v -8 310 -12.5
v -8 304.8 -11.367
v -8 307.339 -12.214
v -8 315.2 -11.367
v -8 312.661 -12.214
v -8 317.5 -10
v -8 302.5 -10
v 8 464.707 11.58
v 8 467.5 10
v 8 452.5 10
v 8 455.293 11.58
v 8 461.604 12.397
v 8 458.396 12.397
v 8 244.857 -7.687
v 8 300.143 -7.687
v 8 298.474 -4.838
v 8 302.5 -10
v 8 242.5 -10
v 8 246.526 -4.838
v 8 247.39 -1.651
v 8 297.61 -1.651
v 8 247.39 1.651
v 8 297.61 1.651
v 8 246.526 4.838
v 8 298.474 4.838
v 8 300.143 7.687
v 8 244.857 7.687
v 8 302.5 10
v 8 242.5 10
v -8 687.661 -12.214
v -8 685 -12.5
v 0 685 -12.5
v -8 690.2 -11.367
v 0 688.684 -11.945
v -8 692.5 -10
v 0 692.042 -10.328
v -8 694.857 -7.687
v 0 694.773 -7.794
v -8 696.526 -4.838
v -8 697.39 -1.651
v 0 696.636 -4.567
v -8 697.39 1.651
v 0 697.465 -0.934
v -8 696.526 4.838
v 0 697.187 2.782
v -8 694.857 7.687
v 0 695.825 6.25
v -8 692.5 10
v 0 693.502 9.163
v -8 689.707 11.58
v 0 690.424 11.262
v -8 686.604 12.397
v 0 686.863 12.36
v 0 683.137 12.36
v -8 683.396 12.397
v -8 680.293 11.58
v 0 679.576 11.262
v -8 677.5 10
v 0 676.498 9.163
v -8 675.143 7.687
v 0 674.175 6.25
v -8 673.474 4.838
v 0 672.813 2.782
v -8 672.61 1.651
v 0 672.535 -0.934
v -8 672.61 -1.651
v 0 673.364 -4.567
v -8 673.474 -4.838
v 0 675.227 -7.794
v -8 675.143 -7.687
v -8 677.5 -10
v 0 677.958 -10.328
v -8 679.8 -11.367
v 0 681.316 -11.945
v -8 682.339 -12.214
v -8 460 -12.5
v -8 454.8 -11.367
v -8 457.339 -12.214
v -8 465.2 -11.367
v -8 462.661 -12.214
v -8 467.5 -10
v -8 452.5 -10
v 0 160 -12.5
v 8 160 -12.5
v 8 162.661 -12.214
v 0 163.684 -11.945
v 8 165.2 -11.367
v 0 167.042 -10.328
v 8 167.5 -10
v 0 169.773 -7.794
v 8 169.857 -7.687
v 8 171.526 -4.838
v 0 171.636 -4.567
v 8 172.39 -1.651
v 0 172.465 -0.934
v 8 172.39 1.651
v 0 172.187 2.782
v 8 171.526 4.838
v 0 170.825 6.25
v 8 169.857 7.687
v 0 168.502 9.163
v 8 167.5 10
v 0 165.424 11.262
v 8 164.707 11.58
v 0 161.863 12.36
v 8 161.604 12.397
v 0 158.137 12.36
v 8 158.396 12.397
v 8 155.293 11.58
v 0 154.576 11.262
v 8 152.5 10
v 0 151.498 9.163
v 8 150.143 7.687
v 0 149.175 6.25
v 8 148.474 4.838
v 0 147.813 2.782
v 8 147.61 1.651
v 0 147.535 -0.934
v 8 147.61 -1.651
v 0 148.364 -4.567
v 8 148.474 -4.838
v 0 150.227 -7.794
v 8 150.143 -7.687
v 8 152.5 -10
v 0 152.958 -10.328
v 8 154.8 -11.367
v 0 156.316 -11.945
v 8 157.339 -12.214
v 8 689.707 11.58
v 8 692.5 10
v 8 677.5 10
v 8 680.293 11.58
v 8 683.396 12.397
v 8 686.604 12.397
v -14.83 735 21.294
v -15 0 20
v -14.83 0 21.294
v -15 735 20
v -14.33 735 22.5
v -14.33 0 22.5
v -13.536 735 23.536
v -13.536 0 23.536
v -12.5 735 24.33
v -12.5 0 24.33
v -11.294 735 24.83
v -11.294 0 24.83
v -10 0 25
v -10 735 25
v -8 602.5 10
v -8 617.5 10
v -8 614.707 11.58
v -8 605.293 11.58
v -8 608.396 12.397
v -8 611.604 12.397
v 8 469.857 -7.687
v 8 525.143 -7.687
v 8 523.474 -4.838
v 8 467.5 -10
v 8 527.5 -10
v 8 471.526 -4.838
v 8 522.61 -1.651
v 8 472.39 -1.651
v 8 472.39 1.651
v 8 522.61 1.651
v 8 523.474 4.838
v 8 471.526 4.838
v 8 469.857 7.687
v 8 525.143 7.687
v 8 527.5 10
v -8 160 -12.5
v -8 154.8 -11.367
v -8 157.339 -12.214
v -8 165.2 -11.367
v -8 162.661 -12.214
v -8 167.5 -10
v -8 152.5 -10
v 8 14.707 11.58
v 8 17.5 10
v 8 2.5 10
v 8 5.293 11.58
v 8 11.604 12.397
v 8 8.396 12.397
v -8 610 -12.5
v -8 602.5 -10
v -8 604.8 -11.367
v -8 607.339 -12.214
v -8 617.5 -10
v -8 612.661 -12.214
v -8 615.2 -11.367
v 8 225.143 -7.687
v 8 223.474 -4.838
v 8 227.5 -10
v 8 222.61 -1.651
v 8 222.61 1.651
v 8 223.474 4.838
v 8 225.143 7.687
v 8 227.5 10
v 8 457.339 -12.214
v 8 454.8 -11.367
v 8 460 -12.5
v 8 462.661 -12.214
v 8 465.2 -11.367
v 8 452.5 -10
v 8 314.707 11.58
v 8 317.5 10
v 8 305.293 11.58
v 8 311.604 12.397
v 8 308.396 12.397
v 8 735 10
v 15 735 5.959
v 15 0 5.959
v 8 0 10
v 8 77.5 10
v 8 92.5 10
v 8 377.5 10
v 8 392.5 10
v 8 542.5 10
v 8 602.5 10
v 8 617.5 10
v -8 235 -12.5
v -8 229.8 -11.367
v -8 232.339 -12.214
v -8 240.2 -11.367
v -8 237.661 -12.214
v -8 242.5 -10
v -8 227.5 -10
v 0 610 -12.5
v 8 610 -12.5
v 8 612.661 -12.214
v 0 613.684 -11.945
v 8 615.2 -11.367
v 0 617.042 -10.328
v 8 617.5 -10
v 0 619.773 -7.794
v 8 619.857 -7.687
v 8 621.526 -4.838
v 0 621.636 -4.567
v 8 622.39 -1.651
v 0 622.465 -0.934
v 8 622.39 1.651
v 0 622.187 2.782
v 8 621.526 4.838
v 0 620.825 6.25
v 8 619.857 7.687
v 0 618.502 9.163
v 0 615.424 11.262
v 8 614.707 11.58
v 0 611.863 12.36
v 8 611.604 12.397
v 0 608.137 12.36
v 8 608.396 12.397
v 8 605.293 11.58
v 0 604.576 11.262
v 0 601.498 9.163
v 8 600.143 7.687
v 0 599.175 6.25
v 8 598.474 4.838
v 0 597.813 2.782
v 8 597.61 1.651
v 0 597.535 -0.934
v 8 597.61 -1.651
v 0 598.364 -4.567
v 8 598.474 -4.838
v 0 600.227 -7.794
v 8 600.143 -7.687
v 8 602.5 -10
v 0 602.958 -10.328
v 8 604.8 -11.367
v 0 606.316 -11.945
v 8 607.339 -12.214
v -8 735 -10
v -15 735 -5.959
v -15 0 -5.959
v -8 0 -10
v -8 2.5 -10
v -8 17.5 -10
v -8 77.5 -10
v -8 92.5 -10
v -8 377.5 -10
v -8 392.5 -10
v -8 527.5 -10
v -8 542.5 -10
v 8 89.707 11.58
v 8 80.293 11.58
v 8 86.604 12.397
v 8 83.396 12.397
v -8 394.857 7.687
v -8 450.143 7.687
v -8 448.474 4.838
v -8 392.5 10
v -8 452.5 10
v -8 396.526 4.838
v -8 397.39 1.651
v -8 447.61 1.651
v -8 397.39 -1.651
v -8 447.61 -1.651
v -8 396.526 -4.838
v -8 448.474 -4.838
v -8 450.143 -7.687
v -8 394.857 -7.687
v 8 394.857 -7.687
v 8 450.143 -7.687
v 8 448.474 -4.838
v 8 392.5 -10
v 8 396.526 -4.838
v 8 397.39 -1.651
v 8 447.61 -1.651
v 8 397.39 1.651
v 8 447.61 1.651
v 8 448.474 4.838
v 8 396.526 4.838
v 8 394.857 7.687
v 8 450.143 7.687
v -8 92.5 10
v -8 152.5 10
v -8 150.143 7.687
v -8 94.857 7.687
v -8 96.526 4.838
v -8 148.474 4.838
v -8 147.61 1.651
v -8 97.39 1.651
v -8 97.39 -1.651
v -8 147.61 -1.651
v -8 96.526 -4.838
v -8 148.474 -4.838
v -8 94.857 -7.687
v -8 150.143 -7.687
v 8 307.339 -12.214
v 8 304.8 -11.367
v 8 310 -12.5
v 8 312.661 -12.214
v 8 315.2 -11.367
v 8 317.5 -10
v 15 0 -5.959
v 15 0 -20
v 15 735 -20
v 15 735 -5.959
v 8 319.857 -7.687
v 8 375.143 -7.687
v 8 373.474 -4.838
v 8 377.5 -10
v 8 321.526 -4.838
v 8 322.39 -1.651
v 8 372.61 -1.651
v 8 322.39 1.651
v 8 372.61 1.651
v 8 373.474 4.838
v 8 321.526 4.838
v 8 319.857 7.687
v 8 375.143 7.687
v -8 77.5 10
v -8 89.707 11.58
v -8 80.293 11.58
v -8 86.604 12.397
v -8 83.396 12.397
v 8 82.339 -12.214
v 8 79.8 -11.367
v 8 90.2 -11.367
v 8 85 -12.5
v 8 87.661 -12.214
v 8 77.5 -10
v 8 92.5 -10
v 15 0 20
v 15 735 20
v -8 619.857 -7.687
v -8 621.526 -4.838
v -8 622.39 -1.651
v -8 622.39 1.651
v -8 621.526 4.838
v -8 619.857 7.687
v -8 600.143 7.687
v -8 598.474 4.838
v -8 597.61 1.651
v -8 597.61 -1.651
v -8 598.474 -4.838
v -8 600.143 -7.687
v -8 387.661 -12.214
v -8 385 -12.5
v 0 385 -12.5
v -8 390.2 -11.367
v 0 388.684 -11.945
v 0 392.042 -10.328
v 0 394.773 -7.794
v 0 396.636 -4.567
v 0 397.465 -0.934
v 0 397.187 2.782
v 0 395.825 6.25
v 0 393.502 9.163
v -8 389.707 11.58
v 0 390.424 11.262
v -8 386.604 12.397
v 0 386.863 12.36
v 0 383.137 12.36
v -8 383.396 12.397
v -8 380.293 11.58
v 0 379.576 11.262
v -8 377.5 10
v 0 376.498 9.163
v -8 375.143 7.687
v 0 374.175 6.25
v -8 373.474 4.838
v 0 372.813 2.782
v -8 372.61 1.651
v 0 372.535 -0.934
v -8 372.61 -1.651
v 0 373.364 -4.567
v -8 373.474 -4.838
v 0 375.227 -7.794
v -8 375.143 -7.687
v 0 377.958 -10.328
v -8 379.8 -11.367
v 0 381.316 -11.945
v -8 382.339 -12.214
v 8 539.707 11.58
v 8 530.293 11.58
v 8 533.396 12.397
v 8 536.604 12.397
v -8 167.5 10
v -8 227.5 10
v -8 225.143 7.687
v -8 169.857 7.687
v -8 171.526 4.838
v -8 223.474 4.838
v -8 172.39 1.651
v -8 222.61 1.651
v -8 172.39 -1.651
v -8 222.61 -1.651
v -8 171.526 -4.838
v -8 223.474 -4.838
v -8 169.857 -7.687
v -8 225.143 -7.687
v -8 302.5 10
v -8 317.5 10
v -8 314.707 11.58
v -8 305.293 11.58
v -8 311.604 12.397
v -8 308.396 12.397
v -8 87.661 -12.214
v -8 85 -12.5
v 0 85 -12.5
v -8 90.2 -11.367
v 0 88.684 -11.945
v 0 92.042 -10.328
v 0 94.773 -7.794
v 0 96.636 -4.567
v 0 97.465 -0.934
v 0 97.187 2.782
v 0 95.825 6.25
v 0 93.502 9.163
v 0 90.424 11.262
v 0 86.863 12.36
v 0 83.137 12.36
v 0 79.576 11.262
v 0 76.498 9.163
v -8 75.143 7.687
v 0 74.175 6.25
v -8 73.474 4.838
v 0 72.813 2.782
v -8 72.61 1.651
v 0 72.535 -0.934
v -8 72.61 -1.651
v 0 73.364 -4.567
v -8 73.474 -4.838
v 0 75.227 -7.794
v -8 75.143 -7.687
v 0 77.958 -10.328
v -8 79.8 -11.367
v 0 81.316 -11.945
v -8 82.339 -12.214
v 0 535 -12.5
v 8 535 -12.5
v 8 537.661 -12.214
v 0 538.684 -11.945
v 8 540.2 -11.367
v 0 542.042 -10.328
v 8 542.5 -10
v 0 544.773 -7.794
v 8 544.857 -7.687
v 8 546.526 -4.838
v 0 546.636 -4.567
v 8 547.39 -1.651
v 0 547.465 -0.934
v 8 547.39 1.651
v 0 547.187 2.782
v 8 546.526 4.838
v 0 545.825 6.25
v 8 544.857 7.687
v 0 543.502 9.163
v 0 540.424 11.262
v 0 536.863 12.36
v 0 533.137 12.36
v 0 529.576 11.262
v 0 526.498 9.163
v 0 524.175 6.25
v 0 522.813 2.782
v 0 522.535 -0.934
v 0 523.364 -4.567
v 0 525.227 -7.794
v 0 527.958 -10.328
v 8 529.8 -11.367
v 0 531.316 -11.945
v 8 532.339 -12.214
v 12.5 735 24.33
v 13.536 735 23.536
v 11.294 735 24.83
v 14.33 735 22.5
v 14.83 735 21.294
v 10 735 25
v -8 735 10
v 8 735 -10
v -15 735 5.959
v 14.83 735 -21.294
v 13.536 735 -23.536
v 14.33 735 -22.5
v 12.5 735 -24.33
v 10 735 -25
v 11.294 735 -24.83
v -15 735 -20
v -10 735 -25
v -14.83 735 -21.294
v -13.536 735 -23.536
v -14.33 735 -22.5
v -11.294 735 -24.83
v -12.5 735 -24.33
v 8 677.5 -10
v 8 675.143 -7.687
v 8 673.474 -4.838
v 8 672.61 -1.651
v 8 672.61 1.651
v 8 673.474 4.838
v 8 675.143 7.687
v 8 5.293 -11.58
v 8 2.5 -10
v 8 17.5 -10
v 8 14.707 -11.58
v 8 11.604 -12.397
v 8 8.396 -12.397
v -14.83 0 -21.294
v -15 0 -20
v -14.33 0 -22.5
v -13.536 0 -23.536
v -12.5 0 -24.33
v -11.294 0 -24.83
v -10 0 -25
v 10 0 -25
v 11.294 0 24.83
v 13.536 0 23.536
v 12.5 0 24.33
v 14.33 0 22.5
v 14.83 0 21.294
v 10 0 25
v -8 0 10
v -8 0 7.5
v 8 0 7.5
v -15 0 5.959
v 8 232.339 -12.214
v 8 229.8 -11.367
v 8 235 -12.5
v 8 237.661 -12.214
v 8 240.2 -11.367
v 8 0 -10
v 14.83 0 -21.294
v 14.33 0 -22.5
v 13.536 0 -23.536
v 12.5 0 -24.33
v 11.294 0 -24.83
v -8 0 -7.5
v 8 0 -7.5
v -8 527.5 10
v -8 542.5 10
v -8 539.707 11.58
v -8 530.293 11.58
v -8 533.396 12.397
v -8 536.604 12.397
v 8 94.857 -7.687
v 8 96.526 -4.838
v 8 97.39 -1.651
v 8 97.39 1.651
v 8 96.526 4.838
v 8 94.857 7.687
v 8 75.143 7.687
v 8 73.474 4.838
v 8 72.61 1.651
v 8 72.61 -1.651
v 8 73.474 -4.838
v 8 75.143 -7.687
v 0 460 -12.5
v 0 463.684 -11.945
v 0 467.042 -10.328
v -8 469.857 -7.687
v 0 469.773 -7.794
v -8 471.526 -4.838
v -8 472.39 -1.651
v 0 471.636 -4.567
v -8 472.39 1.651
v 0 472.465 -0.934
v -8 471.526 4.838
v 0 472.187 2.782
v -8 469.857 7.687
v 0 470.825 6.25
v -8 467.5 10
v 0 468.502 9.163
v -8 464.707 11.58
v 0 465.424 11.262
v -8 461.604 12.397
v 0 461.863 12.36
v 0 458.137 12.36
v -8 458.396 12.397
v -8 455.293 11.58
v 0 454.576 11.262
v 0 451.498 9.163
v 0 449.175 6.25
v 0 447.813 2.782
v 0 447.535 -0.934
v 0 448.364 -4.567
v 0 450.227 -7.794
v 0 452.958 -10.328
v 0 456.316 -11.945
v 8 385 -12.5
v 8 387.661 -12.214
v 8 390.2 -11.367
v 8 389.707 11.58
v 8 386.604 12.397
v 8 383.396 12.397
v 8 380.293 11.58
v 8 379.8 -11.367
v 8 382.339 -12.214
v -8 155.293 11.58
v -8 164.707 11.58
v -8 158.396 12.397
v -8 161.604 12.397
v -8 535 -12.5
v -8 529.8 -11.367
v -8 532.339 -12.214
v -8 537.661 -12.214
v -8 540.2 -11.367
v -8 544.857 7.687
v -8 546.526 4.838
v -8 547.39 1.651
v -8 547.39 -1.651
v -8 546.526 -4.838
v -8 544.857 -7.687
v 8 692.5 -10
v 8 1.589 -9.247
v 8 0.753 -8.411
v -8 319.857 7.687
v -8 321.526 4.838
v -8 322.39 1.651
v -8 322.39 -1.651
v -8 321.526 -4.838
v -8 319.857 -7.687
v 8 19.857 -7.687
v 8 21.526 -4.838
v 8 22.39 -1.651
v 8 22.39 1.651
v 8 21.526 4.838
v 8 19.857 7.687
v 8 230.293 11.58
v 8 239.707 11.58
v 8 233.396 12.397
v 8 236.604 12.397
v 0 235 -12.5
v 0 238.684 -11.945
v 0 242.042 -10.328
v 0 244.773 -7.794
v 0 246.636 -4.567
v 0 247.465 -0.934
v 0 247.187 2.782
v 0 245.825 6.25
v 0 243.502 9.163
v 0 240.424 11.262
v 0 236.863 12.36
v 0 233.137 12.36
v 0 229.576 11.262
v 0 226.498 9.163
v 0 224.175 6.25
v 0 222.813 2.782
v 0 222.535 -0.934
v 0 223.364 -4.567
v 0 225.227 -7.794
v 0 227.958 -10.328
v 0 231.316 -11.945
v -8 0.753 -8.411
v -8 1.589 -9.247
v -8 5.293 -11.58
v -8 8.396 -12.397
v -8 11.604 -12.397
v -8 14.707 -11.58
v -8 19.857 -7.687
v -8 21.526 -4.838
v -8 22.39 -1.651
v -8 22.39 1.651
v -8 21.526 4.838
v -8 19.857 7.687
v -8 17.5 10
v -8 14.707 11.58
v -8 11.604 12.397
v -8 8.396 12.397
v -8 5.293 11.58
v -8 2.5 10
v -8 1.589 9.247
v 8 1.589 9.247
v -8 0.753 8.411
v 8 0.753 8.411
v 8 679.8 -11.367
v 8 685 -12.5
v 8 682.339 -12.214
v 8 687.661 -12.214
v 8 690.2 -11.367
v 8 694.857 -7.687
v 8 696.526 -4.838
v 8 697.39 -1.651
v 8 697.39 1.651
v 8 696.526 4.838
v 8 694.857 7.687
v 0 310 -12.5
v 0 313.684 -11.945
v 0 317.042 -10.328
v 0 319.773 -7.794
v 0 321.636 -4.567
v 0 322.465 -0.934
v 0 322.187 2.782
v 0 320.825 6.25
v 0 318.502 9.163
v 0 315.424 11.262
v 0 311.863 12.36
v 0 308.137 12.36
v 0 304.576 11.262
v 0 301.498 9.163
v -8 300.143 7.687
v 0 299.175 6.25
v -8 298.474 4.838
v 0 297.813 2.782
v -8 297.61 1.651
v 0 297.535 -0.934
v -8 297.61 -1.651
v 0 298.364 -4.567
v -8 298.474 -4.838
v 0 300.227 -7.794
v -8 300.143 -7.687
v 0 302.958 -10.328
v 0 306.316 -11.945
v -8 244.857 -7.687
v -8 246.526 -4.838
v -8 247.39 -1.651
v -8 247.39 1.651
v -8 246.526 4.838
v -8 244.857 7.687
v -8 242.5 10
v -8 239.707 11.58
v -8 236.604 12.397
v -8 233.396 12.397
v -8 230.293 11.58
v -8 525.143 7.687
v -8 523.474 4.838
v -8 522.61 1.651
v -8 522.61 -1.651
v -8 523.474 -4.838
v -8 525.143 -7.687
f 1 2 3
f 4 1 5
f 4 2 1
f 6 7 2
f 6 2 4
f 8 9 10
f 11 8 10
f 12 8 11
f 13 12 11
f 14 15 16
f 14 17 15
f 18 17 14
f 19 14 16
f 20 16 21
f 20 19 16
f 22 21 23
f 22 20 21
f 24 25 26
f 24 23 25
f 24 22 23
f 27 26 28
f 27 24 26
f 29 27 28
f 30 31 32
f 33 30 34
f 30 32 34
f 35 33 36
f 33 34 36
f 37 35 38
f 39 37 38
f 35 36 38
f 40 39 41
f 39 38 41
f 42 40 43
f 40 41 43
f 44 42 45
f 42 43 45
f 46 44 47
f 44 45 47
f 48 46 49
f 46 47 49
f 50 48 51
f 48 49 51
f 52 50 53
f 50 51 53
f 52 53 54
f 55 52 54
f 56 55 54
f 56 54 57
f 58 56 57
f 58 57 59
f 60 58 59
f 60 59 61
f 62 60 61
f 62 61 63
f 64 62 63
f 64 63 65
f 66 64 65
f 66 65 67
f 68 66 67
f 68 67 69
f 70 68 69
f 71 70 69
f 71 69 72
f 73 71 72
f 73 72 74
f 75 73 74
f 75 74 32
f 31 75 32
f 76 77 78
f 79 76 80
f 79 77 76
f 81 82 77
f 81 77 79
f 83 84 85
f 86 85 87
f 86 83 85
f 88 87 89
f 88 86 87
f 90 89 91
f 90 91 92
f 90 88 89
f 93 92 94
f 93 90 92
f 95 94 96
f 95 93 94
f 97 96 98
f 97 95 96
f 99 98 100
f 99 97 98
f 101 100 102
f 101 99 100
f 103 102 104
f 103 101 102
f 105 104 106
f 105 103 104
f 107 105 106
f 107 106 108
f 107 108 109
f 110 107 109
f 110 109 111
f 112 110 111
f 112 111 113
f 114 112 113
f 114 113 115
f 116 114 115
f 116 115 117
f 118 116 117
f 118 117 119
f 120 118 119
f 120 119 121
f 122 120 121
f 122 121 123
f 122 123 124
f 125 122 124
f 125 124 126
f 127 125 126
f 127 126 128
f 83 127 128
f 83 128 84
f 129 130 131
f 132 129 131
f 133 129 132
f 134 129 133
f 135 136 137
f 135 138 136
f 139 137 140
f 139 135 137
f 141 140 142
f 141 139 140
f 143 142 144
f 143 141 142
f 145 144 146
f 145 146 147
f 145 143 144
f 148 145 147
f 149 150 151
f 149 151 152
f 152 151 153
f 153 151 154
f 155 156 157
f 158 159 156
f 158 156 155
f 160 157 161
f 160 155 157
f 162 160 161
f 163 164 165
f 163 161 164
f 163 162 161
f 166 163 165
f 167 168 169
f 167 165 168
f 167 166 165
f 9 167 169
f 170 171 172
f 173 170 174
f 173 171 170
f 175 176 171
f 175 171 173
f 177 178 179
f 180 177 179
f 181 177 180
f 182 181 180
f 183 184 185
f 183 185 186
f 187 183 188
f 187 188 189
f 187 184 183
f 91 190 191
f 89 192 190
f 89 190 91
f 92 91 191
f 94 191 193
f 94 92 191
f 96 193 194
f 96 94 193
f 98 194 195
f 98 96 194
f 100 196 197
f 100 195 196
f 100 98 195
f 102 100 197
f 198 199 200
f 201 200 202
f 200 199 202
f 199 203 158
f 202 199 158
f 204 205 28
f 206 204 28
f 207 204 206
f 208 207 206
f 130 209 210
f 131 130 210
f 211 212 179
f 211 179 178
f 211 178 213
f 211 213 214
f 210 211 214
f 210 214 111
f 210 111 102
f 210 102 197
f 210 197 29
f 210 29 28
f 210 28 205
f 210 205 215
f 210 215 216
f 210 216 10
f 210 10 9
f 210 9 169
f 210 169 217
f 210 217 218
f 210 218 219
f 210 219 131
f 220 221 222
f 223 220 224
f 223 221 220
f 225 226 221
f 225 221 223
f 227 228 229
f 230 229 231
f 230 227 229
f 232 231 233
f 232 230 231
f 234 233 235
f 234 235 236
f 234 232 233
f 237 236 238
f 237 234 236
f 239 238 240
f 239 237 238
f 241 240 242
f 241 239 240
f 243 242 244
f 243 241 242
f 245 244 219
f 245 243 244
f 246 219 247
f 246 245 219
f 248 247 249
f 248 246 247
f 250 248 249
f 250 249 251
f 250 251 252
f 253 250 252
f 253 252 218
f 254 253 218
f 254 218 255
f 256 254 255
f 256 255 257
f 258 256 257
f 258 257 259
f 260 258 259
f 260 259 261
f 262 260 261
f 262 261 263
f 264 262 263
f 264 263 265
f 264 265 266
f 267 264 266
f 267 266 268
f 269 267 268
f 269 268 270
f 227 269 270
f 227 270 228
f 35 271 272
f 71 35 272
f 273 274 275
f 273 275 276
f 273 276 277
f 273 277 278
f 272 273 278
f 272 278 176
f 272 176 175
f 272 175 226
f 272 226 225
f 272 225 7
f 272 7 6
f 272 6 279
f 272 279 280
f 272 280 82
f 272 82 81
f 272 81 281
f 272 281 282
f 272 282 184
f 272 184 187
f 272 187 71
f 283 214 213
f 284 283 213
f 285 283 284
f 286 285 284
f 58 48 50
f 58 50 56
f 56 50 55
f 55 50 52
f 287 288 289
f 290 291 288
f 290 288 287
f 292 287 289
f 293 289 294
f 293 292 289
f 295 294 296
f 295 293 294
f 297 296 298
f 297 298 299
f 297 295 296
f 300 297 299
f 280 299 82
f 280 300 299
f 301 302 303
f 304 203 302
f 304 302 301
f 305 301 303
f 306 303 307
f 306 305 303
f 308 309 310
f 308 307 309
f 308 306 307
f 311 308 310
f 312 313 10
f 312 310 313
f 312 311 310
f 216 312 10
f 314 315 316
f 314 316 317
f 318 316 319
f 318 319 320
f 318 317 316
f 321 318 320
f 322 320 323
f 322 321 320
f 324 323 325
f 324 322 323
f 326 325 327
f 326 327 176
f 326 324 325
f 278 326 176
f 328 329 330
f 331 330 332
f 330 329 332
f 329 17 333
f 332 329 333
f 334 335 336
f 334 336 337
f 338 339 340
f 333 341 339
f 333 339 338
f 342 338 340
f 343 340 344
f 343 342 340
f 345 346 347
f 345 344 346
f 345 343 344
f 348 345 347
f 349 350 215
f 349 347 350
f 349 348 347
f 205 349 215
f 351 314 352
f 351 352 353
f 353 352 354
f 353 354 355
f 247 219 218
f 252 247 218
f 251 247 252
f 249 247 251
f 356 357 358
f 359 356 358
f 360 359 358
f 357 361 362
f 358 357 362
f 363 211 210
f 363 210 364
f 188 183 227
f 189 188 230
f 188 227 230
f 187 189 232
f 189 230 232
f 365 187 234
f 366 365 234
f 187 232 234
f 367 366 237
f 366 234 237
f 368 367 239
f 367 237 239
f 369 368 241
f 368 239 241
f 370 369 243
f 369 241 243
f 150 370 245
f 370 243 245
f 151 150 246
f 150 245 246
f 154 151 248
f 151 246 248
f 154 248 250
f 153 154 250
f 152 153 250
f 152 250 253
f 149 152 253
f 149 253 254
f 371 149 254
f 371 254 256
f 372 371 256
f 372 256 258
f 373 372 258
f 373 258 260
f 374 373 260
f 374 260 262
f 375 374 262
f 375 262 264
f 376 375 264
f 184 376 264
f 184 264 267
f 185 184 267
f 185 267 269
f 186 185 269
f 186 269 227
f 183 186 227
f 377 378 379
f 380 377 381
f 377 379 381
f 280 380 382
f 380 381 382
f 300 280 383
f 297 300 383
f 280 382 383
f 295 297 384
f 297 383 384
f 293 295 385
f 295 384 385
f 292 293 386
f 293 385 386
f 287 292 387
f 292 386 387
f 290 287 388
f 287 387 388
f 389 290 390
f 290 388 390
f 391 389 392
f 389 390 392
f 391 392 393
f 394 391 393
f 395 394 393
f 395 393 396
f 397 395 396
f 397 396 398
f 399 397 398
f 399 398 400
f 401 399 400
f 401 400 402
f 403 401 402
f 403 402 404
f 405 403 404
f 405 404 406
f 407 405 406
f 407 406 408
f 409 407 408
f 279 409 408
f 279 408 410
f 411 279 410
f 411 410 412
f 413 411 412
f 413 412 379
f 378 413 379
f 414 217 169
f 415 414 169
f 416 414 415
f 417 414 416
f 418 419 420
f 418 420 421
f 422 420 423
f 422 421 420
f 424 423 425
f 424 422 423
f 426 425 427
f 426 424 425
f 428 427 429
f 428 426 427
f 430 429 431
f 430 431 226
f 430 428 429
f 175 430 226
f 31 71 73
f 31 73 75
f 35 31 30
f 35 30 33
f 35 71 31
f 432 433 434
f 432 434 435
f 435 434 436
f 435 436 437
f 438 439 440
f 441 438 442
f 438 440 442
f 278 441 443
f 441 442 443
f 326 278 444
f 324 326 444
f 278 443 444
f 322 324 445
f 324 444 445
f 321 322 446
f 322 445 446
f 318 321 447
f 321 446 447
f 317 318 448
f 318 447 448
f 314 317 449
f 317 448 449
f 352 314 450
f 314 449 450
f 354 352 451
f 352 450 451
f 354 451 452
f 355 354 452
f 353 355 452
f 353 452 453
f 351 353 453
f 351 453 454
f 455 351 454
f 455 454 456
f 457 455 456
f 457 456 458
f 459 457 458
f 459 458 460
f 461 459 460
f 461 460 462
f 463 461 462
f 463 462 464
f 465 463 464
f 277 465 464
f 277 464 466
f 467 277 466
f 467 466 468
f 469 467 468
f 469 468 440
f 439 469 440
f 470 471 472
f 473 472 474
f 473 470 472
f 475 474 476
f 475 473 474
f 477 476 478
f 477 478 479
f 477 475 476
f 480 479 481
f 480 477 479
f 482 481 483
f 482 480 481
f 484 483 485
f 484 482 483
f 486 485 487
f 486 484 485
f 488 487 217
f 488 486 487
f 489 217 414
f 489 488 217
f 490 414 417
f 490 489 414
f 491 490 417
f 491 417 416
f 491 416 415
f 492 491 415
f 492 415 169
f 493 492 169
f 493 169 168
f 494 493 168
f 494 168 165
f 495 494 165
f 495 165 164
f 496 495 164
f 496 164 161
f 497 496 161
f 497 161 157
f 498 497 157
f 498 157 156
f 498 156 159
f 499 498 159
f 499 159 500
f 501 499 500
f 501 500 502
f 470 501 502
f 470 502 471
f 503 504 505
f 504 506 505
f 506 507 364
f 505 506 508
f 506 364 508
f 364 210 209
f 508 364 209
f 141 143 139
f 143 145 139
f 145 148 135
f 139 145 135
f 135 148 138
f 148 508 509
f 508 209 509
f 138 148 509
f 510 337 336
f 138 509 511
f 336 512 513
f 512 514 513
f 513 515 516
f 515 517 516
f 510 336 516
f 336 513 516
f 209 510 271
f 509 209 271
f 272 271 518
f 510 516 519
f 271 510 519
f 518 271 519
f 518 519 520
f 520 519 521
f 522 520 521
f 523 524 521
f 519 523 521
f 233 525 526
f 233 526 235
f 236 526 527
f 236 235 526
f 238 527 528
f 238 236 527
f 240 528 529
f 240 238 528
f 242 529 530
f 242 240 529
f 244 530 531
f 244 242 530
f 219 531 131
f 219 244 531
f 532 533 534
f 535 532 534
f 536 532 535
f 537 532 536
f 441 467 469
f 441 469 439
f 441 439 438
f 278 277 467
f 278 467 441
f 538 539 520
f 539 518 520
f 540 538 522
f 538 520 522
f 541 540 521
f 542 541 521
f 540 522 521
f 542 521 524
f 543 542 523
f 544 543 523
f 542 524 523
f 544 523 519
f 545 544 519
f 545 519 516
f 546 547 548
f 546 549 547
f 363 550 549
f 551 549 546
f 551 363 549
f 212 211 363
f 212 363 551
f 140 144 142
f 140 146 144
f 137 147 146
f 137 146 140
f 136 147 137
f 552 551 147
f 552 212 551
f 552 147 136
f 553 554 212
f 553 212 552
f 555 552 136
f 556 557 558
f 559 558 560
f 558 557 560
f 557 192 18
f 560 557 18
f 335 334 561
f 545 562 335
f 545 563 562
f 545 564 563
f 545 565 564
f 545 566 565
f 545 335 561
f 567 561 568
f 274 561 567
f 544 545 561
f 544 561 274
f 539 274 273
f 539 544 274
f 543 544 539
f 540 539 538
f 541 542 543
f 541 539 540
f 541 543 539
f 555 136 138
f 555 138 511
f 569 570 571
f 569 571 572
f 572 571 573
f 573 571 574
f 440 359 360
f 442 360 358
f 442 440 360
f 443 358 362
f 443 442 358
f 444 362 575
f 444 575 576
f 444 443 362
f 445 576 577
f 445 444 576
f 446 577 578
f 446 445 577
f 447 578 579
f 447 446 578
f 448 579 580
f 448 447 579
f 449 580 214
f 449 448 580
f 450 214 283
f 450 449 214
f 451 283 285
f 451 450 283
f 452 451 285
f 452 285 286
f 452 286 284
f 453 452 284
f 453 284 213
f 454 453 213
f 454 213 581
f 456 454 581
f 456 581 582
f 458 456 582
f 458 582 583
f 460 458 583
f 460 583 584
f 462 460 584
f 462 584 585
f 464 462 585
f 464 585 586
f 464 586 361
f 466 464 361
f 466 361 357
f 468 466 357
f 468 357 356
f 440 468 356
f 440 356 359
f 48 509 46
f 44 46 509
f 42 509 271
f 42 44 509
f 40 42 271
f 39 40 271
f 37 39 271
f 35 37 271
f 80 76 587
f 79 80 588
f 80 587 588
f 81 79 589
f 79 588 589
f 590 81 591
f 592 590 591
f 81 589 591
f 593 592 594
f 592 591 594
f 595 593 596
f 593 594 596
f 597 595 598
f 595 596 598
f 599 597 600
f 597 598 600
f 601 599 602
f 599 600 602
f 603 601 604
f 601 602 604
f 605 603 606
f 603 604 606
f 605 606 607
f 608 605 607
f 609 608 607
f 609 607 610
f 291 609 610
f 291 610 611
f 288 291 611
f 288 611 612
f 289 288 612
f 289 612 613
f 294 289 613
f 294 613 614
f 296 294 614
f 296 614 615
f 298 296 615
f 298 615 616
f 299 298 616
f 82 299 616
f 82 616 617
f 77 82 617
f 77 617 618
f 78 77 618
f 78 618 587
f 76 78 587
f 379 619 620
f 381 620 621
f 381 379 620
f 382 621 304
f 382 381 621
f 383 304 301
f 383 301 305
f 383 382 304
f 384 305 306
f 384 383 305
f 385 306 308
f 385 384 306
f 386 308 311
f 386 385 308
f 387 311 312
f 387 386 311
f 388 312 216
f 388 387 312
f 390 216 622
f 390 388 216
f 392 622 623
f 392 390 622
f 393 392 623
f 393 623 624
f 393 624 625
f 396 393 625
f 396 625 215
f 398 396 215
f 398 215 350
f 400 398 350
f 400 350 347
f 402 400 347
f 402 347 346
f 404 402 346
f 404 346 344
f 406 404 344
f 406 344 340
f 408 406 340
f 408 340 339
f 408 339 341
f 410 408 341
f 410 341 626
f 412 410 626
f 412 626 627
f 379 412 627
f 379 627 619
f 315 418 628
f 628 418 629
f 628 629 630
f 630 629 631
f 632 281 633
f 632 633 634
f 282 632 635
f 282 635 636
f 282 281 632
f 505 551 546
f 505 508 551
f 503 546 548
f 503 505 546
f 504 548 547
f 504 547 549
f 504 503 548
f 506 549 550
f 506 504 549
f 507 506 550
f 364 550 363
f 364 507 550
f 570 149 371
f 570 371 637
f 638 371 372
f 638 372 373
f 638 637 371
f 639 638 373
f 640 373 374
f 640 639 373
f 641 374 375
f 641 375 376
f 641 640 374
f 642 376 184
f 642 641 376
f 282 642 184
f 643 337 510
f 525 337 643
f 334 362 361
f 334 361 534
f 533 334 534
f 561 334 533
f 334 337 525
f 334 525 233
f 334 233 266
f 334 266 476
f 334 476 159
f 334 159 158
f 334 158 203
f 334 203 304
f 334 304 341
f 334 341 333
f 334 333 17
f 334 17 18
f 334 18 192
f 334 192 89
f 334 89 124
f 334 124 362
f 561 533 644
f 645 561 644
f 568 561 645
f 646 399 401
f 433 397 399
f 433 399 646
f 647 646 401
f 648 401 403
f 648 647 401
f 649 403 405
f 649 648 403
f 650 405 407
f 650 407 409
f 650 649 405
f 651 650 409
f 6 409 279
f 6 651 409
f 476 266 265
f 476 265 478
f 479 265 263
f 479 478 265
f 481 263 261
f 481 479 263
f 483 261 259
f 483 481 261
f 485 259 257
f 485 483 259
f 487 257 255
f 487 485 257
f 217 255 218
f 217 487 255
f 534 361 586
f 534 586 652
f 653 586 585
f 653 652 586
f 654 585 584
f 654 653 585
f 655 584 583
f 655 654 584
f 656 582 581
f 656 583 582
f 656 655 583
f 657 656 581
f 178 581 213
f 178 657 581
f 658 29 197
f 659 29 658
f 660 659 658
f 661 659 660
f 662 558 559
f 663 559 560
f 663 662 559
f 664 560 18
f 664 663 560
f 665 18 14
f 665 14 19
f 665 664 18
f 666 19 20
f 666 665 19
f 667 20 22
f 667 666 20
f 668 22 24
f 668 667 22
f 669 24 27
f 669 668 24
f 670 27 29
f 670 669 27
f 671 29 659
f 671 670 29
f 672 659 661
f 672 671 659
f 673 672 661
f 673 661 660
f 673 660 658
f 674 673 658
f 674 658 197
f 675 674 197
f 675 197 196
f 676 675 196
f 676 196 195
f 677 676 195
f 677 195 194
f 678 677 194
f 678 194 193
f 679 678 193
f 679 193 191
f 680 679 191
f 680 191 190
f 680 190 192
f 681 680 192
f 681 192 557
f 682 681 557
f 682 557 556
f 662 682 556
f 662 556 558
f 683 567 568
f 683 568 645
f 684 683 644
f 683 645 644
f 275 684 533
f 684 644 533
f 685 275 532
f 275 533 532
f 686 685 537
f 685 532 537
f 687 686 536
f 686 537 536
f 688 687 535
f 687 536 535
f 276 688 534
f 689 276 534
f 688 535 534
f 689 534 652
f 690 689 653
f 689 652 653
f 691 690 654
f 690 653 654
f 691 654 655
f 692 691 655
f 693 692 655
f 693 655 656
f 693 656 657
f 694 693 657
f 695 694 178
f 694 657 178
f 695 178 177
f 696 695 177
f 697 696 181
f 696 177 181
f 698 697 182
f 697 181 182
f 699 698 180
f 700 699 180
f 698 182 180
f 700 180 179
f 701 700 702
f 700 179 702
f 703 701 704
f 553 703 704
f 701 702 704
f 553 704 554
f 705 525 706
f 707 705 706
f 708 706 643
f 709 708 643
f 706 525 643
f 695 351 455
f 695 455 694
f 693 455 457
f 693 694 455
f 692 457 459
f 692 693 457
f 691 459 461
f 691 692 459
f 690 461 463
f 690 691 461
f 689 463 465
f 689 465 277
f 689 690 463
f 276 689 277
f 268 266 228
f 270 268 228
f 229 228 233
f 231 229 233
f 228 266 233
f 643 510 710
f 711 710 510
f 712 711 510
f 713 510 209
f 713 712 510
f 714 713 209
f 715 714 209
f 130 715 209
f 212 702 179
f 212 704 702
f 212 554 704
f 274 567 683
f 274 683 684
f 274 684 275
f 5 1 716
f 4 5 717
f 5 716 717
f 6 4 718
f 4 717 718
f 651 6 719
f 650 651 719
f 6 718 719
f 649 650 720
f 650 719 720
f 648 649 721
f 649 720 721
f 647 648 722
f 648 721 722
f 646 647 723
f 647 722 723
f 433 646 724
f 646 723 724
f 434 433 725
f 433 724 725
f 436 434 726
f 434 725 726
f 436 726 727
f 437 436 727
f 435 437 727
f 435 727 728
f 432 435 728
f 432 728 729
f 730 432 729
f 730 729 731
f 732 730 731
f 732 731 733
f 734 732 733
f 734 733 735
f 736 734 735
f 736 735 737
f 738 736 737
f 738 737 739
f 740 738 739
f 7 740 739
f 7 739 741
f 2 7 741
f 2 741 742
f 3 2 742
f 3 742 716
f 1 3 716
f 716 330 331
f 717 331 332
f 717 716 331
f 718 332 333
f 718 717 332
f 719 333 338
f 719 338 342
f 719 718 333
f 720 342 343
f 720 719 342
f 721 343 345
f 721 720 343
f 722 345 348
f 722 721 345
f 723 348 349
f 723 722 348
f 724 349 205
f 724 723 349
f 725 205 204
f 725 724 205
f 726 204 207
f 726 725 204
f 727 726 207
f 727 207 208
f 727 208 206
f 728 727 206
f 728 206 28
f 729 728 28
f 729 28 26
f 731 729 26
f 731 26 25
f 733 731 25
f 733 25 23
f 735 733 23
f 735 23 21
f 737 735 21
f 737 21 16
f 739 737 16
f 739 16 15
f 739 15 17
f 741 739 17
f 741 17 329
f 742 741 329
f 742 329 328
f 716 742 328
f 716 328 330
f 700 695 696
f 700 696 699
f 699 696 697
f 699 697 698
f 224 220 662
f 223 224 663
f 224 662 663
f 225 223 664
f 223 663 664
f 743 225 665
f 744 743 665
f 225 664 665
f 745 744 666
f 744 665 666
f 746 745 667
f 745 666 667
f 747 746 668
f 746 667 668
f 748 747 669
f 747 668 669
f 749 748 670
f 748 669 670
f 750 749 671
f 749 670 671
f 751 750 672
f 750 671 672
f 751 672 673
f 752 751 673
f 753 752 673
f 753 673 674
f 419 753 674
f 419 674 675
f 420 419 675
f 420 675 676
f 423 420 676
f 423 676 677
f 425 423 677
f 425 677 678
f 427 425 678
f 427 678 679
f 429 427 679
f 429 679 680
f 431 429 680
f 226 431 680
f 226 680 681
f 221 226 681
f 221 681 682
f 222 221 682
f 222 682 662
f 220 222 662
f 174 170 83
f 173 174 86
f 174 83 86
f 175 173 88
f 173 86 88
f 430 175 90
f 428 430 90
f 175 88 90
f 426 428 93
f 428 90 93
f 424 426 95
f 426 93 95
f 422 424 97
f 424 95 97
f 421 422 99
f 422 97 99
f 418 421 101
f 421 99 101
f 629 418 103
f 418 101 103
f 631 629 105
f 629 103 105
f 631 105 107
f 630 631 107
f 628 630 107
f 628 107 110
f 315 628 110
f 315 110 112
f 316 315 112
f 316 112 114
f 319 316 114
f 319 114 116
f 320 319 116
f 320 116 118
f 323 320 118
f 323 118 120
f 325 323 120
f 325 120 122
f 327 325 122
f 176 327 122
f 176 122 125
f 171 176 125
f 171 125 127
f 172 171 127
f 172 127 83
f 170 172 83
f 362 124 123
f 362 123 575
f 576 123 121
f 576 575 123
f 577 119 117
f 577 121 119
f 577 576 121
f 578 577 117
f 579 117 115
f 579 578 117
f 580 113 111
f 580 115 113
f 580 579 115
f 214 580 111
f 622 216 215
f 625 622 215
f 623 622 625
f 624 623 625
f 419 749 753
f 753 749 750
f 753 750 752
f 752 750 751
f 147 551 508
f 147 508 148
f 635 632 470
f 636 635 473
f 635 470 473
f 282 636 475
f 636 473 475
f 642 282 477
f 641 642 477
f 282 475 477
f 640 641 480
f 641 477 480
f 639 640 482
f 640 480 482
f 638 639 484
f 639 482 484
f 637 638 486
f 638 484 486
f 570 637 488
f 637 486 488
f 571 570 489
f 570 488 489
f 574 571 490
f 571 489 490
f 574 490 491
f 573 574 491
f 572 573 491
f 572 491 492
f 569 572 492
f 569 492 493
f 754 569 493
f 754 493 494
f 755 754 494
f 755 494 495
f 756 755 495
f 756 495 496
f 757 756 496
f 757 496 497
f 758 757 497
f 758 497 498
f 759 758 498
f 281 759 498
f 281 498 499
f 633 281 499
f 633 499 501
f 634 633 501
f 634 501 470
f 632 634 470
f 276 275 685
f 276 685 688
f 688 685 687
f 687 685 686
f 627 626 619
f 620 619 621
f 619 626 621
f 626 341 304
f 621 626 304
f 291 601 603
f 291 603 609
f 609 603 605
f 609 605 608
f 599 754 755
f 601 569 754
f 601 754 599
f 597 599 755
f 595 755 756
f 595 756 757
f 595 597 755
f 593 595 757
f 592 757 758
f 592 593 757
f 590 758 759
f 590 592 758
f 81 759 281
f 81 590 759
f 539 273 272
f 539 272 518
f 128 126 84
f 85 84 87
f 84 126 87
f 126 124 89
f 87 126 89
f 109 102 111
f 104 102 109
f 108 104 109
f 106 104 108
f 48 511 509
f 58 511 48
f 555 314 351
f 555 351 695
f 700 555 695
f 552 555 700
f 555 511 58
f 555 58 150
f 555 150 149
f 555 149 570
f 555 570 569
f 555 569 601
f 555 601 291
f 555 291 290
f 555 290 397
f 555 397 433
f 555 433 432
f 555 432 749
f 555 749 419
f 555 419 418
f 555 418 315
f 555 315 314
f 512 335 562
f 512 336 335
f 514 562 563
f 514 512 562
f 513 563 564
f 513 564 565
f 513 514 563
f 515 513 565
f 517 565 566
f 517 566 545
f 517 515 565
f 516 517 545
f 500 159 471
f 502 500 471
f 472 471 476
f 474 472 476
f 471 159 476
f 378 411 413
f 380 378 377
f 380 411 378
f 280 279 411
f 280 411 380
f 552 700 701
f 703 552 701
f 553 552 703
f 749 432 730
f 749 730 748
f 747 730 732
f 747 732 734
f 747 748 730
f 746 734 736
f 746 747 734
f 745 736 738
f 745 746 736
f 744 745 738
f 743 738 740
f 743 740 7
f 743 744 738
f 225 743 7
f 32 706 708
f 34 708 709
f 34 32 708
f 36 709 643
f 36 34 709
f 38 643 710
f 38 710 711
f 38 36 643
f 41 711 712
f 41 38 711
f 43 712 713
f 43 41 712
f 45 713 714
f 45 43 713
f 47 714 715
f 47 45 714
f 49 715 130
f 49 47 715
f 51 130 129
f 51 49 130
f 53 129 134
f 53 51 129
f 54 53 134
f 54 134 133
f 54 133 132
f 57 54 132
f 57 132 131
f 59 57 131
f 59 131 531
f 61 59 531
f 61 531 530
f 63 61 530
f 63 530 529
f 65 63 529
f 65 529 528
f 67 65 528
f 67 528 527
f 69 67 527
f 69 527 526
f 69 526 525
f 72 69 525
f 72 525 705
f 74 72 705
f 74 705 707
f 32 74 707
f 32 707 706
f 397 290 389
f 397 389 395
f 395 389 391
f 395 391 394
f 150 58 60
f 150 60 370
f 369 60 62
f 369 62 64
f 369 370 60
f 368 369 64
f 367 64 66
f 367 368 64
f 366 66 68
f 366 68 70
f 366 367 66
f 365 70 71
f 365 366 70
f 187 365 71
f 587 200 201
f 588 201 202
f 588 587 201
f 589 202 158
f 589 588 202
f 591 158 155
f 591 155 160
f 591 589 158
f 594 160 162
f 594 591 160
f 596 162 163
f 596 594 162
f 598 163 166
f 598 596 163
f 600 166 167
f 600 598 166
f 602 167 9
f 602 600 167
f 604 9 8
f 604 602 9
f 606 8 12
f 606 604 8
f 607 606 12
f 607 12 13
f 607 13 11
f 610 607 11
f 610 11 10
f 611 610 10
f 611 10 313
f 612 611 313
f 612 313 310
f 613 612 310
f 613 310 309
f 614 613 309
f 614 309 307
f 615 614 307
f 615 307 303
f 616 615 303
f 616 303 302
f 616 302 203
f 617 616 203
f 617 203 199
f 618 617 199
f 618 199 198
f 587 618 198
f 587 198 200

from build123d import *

# Parameters (mm, degrees)
BOSS_EXTRUDE1_DEPTH     = 735
SKETCH3_R               = 12.5
CUT_EXTRUDE2_DEPTH      = 8
CUT_EXTRUDE2_DEPTH_BACK = 8
FILLET1_R               = 5


with BuildPart() as part:
    # Sketch1 → Boss-Extrude1 (new body)
    with BuildSketch(Plane(origin=(0, 0, 0), x_dir=(1, 0, 0), z_dir=(0, 1, 0))):
        Polygon((15, 25), (15, 5.958548116), (8, 10), (8, -10), (15, -5.958548116), (15, -25), (-15, -25), (-15, -5.958548116), (-8, -10), (-8, 10), (-15, 5.958548116), (-15, 25), align=None)
    extrude(amount=BOSS_EXTRUDE1_DEPTH)

    # Sketch3 → Cut-Extrude2 (cut, two sides)
    with BuildSketch(Plane(origin=(0, 0, 0), x_dir=(0, 0, -1), z_dir=(1, 0, 0))) as cut_extrude2_sk:
        with Locations((0, 685)):
            Circle(SKETCH3_R)
        with Locations((0, 610)):
            Circle(SKETCH3_R)
        with Locations((0, 535)):
            Circle(SKETCH3_R)
        with Locations((0, 460)):
            Circle(SKETCH3_R)
        with Locations((0, 385)):
            Circle(SKETCH3_R)
        with Locations((0, 310)):
            Circle(SKETCH3_R)
        with Locations((0, 235)):
            Circle(SKETCH3_R)
        with Locations((0, 160)):
            Circle(SKETCH3_R)
        with Locations((0, 85)):
            Circle(SKETCH3_R)
        with Locations((0, 10)):
            Circle(SKETCH3_R)
        with Locations((0, -65)):
            Circle(SKETCH3_R)
    extrude(amount=CUT_EXTRUDE2_DEPTH, mode=Mode.SUBTRACT)
    extrude(cut_extrude2_sk.sketch, amount=-CUT_EXTRUDE2_DEPTH_BACK, mode=Mode.SUBTRACT)

    # Fillet1
    fillet1_edges = [part.edges().sort_by_distance(p)[0] for p in [
        (15, 367.5, -25),
        (15, 367.5, 25),
        (-15, 367.5, 25),
        (-15, 367.5, -25),
    ]]
    fillet(fillet1_edges, radius=FILLET1_R)


solid = part.part
